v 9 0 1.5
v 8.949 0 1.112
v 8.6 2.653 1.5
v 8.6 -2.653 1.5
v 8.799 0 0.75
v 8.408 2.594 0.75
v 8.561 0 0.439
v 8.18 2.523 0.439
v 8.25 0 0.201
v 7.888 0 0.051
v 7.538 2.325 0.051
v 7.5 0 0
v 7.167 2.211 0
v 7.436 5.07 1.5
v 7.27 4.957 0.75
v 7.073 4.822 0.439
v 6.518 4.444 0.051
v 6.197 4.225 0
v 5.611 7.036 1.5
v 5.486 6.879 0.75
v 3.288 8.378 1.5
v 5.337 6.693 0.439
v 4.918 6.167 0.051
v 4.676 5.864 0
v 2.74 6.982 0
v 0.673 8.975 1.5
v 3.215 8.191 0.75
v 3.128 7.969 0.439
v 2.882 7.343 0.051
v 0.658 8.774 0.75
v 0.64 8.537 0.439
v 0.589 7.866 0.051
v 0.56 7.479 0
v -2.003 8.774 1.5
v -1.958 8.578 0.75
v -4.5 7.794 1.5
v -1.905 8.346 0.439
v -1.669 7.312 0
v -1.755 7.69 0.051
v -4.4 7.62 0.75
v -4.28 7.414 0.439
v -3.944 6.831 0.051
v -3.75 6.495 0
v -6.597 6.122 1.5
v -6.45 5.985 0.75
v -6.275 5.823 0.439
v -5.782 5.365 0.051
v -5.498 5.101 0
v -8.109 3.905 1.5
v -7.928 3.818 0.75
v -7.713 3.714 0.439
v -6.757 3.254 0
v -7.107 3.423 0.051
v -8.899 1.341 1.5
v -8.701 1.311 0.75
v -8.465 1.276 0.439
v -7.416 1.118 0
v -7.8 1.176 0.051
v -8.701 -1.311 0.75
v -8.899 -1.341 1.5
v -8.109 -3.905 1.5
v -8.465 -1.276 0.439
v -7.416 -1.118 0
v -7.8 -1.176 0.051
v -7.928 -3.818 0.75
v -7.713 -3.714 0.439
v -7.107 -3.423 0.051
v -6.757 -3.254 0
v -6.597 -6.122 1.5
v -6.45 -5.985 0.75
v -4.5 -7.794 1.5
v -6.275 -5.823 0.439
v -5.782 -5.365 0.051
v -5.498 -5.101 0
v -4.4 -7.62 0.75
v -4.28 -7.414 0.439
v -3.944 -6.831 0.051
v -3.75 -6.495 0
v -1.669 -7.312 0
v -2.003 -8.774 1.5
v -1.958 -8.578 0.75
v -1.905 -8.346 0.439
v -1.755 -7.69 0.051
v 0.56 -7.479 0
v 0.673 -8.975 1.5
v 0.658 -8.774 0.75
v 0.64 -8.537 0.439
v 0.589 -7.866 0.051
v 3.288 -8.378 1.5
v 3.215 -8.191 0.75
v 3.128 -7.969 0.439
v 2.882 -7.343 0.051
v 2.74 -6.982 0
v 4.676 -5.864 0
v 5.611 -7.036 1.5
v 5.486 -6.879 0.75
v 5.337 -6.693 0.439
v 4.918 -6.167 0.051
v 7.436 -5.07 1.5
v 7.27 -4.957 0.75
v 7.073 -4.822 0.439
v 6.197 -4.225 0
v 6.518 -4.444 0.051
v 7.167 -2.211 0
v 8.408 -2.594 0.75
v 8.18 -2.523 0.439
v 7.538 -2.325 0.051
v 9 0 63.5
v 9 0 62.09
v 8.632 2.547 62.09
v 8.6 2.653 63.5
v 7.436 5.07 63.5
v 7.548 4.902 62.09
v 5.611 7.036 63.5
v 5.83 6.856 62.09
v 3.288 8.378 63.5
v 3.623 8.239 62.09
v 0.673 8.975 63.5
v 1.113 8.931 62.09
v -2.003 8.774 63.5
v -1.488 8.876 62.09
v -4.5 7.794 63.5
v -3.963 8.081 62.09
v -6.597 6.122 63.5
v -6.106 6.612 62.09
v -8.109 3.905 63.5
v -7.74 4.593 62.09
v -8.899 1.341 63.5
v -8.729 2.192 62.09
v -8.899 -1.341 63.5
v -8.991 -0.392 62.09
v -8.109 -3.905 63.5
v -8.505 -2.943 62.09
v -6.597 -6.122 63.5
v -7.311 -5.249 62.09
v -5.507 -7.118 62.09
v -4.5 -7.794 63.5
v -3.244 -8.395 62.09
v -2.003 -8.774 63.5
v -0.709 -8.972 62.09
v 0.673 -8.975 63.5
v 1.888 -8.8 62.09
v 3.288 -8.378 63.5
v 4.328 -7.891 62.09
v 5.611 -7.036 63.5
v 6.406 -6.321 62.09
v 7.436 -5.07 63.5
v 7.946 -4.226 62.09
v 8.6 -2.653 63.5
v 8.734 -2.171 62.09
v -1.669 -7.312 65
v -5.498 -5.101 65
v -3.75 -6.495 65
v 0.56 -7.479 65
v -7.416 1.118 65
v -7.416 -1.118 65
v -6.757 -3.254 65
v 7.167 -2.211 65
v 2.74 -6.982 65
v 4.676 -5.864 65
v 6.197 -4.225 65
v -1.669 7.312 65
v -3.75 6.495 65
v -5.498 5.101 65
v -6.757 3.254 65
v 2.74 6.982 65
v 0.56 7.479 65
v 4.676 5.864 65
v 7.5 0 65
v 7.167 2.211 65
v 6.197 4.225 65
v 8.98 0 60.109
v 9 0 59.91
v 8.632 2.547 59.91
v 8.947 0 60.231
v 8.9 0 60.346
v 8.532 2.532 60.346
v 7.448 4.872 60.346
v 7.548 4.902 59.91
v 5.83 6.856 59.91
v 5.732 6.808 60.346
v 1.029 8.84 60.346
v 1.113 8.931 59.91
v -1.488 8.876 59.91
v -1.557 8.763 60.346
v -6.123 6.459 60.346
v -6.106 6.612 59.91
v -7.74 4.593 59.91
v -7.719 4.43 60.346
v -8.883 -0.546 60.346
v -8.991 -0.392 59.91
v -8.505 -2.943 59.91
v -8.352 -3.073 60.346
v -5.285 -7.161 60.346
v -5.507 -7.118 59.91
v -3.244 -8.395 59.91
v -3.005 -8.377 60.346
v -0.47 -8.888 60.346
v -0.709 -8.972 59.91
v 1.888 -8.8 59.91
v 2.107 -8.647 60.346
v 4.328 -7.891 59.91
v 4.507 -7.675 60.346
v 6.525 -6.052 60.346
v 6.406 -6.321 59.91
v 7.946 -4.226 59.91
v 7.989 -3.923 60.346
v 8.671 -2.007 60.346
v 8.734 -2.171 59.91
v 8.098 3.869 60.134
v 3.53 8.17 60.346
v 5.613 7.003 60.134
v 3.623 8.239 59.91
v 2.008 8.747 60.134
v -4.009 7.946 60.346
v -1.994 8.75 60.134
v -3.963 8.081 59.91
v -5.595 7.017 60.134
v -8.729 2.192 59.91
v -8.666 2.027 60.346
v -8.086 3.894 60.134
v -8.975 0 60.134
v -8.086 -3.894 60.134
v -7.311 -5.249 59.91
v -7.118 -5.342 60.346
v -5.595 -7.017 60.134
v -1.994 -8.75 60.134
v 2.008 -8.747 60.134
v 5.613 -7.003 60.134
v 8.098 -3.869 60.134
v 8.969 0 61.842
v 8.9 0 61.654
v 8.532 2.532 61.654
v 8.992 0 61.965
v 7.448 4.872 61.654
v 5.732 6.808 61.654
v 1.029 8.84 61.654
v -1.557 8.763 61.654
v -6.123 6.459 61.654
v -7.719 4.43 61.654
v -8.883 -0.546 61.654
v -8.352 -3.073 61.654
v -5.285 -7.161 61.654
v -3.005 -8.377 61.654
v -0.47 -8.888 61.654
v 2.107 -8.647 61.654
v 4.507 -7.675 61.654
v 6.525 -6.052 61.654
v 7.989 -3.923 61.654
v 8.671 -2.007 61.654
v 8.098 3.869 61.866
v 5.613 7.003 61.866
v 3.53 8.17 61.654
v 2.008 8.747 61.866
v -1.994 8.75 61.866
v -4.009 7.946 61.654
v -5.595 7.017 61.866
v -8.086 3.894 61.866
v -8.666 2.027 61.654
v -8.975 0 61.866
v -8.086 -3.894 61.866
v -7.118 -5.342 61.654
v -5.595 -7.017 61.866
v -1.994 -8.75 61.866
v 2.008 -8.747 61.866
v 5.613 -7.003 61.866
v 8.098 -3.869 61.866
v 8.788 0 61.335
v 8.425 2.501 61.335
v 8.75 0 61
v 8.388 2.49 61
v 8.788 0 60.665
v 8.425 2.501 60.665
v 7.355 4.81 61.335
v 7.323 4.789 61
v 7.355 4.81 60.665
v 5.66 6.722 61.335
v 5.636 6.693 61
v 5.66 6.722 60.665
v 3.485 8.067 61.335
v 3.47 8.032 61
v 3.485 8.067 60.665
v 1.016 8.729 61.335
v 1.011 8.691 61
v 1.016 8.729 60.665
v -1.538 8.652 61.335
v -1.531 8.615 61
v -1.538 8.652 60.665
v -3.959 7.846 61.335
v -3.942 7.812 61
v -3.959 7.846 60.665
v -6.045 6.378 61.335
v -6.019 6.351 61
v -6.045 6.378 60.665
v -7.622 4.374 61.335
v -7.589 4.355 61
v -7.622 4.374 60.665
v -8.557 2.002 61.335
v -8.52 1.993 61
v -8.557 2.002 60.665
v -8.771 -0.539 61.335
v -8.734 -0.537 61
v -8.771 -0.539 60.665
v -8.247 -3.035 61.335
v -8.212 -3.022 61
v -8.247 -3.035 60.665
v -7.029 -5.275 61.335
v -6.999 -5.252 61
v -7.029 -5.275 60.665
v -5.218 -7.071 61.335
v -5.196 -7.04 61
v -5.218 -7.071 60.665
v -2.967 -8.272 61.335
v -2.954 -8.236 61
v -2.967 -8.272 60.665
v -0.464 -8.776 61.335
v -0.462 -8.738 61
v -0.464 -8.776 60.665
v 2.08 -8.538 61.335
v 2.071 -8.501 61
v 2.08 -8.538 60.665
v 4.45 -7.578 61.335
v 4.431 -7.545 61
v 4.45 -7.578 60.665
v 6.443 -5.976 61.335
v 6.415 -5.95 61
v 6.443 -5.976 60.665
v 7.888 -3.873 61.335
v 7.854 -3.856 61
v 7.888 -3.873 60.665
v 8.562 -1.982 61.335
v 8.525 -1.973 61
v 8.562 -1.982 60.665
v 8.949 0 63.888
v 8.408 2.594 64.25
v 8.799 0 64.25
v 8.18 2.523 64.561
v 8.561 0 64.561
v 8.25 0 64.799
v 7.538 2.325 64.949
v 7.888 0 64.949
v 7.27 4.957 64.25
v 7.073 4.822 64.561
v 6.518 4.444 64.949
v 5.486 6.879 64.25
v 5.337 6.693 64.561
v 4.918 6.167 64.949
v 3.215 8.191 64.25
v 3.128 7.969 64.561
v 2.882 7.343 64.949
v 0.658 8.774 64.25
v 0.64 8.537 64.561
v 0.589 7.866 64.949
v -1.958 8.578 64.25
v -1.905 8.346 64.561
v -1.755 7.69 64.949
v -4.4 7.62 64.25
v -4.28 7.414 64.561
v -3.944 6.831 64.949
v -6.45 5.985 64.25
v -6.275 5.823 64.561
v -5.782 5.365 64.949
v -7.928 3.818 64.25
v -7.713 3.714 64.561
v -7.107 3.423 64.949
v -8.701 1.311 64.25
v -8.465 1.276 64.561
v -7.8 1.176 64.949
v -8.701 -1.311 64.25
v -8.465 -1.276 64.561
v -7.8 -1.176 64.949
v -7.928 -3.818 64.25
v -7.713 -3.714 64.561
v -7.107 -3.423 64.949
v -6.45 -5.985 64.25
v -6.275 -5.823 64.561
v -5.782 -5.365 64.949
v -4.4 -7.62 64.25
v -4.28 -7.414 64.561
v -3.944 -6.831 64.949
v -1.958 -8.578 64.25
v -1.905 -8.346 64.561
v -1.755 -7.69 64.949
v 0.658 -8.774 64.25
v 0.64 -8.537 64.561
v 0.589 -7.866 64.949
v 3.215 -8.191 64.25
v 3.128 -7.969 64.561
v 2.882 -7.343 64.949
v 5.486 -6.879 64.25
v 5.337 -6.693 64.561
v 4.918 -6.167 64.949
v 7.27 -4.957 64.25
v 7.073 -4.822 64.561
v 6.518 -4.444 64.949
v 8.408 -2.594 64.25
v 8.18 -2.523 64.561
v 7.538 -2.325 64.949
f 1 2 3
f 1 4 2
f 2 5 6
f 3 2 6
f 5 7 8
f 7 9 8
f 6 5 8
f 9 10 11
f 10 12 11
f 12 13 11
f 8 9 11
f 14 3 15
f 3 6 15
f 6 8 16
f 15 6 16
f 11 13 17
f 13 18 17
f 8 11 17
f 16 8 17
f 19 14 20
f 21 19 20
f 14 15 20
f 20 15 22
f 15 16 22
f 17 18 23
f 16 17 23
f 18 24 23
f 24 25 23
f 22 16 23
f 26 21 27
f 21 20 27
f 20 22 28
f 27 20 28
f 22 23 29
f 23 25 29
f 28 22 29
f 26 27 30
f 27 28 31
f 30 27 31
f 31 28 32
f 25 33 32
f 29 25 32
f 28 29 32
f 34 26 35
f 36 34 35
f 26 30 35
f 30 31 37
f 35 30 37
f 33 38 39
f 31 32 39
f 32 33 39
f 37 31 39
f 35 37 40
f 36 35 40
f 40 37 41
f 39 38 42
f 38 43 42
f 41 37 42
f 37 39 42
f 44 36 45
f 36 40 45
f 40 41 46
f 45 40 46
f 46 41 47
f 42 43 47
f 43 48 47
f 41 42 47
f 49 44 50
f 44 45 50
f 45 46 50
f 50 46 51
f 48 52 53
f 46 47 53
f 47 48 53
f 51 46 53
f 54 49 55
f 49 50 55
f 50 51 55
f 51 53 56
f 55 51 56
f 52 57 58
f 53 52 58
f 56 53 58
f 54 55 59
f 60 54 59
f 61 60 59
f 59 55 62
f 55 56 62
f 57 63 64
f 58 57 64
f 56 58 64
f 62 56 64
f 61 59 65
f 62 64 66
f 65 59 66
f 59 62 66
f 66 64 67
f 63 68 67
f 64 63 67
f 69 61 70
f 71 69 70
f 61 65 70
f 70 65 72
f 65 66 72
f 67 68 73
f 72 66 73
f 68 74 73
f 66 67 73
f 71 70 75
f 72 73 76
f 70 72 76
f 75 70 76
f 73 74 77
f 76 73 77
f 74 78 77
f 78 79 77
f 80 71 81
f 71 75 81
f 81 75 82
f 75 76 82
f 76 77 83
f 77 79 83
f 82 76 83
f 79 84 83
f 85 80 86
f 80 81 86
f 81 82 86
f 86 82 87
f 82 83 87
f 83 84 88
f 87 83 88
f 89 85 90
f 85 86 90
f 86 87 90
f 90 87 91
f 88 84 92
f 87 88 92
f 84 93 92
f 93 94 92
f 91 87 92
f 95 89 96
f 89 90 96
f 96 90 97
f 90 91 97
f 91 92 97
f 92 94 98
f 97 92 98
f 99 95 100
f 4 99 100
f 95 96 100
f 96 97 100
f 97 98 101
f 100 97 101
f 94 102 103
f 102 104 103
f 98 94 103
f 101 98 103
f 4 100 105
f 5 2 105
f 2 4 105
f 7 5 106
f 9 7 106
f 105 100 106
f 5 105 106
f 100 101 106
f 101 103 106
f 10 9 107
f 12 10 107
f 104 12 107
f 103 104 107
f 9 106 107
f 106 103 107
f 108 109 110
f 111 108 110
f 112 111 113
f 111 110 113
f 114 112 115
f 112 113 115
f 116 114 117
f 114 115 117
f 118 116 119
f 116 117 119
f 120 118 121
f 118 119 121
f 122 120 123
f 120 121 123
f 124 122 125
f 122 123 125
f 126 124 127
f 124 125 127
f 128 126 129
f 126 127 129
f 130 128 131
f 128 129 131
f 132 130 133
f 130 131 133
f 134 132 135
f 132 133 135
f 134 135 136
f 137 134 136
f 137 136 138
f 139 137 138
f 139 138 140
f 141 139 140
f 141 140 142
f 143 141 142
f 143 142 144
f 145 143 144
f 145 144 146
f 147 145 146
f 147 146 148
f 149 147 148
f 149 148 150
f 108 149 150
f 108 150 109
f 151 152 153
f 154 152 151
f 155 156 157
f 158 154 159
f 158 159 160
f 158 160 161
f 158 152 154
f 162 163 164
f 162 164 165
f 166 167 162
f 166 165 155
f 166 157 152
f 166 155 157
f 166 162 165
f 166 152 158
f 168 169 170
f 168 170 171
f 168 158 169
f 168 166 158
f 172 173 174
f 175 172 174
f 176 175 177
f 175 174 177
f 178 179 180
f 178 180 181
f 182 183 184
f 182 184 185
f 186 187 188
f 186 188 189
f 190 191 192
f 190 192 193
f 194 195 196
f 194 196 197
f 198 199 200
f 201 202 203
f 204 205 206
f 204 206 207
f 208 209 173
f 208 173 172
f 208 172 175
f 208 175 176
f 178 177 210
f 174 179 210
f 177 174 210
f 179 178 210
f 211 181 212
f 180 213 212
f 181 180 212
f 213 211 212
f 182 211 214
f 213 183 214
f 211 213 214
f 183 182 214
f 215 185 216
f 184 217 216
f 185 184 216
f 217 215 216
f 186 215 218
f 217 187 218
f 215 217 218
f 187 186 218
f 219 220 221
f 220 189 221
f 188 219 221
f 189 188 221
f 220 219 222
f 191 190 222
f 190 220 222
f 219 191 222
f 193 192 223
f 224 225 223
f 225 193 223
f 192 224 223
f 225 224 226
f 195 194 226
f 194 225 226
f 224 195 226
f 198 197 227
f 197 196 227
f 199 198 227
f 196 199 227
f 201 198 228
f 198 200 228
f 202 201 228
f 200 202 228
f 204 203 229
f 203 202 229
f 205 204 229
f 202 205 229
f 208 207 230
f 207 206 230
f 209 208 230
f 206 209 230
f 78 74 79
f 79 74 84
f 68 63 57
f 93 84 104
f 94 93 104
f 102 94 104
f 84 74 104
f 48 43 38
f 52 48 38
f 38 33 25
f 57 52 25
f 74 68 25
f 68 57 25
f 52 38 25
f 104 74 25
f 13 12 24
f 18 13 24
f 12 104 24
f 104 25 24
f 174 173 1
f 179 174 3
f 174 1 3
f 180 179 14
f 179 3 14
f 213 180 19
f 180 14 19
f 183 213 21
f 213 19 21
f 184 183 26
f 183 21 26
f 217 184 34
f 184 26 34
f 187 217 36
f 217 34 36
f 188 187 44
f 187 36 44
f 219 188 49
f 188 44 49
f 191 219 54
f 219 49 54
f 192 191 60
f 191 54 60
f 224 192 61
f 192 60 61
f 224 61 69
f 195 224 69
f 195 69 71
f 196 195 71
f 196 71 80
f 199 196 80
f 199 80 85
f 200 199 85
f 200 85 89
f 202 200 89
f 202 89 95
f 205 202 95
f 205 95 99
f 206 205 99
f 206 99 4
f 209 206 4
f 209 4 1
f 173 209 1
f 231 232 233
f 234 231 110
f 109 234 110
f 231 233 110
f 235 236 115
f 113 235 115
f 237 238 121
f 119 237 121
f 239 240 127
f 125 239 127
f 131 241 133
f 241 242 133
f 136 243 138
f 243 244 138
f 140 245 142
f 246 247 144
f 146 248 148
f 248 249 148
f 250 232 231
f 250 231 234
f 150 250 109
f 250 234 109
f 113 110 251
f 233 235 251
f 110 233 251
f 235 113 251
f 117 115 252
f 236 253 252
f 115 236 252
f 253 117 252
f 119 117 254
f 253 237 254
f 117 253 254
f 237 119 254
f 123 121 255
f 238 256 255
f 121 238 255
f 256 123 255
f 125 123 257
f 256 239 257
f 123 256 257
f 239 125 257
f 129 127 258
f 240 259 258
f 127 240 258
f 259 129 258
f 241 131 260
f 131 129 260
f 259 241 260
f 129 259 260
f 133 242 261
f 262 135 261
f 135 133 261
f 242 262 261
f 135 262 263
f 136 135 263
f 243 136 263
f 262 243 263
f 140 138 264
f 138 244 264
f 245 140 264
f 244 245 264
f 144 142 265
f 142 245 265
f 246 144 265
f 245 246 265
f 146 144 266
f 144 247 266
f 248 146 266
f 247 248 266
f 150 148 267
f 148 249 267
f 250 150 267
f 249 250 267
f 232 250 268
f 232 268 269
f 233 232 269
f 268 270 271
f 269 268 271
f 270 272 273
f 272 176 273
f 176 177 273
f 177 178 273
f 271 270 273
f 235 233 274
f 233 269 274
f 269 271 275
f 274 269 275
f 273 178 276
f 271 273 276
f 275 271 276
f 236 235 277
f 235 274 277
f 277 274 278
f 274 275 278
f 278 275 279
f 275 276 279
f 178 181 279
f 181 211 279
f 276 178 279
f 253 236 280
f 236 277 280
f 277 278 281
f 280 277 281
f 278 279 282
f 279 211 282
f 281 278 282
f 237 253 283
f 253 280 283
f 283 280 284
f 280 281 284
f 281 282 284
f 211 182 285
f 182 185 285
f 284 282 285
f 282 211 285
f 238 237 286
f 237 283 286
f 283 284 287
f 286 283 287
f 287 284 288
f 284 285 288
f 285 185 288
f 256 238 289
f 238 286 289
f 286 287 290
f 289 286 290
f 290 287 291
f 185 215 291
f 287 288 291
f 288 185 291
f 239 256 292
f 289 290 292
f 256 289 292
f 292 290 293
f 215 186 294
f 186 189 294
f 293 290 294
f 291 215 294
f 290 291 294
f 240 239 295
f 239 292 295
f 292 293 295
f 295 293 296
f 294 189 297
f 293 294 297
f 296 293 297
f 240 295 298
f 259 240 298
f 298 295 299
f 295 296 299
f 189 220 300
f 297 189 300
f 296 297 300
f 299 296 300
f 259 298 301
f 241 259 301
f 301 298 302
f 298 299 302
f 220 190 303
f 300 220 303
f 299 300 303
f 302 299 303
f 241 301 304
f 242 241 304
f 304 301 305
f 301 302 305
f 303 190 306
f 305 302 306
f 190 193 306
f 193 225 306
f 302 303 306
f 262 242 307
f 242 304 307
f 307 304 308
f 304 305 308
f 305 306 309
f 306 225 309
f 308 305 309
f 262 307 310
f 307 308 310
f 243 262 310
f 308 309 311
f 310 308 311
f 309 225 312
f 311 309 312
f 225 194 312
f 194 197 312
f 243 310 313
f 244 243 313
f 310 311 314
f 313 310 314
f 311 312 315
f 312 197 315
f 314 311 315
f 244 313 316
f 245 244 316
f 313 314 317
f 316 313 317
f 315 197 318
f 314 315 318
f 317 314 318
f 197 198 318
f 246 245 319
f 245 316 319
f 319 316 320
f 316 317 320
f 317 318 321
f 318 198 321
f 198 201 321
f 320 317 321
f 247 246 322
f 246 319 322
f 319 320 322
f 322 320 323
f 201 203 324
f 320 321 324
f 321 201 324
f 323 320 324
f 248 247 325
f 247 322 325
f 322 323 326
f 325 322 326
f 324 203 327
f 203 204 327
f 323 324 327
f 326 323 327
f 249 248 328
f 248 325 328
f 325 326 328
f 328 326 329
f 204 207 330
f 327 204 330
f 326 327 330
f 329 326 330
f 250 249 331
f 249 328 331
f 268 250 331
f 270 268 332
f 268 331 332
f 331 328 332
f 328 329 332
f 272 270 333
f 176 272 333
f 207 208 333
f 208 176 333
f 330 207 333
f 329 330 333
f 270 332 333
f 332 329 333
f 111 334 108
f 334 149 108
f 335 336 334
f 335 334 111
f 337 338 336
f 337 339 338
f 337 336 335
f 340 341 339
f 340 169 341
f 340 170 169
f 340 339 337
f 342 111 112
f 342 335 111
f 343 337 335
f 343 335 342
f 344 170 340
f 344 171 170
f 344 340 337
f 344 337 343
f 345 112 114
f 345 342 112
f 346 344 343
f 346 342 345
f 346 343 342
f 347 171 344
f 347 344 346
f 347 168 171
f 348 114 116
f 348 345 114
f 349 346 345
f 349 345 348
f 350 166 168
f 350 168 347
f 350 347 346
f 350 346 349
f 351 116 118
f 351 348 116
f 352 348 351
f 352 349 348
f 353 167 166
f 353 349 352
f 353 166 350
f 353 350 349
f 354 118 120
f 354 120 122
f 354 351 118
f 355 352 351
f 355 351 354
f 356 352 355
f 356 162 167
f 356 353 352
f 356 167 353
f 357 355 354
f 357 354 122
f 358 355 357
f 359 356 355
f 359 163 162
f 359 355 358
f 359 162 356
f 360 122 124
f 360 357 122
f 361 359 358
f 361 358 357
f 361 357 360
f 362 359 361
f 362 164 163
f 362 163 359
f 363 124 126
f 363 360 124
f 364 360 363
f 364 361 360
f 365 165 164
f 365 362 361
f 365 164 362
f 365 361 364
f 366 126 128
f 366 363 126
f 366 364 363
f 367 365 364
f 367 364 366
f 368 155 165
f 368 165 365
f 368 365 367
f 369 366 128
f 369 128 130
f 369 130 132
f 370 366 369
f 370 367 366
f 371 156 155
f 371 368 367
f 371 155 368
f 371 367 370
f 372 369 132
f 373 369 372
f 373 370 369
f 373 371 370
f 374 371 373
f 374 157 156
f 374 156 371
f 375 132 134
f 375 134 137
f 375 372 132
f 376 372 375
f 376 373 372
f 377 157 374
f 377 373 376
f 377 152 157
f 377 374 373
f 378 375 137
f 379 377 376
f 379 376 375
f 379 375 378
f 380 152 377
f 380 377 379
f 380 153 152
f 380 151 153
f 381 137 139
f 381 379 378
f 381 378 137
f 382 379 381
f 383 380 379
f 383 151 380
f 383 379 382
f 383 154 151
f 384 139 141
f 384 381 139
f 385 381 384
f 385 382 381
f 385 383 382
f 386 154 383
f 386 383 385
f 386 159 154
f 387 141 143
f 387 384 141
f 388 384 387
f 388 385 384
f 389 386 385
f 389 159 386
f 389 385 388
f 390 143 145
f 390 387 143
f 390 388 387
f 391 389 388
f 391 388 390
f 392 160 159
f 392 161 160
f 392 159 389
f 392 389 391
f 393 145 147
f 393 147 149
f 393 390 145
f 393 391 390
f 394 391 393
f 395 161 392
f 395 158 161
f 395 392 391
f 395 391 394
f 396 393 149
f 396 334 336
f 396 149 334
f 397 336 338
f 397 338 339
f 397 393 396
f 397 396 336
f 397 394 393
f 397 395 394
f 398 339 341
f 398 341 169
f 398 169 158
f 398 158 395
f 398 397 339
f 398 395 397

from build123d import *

# Parameters (mm, degrees)
F0_R     = 9
F1_DEPTH = 65
F2_R     = 1.5
F3_R     = 1.5
F5_R     = 1


with BuildPart() as f1:
    # F0 (on Top) → F1 (new body)
    with BuildSketch(Plane.XY):
        Circle(F0_R)
    extrude(amount=F1_DEPTH)

    # F2
    f2_edges = [f1.edges().sort_by_distance(p)[0] for p in [
        (-9, 0, 65),
        (-9, 0, 0),
    ]]
    fillet(f2_edges, radius=F2_R)

    # F3 (on Front) → F4 (revolve, cut)
    with BuildSketch(Plane.XZ):
        with Locations((10.25, 61)):
            Circle(F3_R)
    revolve(axis=Axis((0, 0, 65), (0, 0, 1)), mode=Mode.SUBTRACT)

    # F5
    f5_edges = [f1.edges().sort_by_distance(p)[0] for p in [
        (-9, 0, 60.170844),
        (-9, 0, 61.829156),
    ]]
    fillet(f5_edges, radius=F5_R)


solid = f1.part
